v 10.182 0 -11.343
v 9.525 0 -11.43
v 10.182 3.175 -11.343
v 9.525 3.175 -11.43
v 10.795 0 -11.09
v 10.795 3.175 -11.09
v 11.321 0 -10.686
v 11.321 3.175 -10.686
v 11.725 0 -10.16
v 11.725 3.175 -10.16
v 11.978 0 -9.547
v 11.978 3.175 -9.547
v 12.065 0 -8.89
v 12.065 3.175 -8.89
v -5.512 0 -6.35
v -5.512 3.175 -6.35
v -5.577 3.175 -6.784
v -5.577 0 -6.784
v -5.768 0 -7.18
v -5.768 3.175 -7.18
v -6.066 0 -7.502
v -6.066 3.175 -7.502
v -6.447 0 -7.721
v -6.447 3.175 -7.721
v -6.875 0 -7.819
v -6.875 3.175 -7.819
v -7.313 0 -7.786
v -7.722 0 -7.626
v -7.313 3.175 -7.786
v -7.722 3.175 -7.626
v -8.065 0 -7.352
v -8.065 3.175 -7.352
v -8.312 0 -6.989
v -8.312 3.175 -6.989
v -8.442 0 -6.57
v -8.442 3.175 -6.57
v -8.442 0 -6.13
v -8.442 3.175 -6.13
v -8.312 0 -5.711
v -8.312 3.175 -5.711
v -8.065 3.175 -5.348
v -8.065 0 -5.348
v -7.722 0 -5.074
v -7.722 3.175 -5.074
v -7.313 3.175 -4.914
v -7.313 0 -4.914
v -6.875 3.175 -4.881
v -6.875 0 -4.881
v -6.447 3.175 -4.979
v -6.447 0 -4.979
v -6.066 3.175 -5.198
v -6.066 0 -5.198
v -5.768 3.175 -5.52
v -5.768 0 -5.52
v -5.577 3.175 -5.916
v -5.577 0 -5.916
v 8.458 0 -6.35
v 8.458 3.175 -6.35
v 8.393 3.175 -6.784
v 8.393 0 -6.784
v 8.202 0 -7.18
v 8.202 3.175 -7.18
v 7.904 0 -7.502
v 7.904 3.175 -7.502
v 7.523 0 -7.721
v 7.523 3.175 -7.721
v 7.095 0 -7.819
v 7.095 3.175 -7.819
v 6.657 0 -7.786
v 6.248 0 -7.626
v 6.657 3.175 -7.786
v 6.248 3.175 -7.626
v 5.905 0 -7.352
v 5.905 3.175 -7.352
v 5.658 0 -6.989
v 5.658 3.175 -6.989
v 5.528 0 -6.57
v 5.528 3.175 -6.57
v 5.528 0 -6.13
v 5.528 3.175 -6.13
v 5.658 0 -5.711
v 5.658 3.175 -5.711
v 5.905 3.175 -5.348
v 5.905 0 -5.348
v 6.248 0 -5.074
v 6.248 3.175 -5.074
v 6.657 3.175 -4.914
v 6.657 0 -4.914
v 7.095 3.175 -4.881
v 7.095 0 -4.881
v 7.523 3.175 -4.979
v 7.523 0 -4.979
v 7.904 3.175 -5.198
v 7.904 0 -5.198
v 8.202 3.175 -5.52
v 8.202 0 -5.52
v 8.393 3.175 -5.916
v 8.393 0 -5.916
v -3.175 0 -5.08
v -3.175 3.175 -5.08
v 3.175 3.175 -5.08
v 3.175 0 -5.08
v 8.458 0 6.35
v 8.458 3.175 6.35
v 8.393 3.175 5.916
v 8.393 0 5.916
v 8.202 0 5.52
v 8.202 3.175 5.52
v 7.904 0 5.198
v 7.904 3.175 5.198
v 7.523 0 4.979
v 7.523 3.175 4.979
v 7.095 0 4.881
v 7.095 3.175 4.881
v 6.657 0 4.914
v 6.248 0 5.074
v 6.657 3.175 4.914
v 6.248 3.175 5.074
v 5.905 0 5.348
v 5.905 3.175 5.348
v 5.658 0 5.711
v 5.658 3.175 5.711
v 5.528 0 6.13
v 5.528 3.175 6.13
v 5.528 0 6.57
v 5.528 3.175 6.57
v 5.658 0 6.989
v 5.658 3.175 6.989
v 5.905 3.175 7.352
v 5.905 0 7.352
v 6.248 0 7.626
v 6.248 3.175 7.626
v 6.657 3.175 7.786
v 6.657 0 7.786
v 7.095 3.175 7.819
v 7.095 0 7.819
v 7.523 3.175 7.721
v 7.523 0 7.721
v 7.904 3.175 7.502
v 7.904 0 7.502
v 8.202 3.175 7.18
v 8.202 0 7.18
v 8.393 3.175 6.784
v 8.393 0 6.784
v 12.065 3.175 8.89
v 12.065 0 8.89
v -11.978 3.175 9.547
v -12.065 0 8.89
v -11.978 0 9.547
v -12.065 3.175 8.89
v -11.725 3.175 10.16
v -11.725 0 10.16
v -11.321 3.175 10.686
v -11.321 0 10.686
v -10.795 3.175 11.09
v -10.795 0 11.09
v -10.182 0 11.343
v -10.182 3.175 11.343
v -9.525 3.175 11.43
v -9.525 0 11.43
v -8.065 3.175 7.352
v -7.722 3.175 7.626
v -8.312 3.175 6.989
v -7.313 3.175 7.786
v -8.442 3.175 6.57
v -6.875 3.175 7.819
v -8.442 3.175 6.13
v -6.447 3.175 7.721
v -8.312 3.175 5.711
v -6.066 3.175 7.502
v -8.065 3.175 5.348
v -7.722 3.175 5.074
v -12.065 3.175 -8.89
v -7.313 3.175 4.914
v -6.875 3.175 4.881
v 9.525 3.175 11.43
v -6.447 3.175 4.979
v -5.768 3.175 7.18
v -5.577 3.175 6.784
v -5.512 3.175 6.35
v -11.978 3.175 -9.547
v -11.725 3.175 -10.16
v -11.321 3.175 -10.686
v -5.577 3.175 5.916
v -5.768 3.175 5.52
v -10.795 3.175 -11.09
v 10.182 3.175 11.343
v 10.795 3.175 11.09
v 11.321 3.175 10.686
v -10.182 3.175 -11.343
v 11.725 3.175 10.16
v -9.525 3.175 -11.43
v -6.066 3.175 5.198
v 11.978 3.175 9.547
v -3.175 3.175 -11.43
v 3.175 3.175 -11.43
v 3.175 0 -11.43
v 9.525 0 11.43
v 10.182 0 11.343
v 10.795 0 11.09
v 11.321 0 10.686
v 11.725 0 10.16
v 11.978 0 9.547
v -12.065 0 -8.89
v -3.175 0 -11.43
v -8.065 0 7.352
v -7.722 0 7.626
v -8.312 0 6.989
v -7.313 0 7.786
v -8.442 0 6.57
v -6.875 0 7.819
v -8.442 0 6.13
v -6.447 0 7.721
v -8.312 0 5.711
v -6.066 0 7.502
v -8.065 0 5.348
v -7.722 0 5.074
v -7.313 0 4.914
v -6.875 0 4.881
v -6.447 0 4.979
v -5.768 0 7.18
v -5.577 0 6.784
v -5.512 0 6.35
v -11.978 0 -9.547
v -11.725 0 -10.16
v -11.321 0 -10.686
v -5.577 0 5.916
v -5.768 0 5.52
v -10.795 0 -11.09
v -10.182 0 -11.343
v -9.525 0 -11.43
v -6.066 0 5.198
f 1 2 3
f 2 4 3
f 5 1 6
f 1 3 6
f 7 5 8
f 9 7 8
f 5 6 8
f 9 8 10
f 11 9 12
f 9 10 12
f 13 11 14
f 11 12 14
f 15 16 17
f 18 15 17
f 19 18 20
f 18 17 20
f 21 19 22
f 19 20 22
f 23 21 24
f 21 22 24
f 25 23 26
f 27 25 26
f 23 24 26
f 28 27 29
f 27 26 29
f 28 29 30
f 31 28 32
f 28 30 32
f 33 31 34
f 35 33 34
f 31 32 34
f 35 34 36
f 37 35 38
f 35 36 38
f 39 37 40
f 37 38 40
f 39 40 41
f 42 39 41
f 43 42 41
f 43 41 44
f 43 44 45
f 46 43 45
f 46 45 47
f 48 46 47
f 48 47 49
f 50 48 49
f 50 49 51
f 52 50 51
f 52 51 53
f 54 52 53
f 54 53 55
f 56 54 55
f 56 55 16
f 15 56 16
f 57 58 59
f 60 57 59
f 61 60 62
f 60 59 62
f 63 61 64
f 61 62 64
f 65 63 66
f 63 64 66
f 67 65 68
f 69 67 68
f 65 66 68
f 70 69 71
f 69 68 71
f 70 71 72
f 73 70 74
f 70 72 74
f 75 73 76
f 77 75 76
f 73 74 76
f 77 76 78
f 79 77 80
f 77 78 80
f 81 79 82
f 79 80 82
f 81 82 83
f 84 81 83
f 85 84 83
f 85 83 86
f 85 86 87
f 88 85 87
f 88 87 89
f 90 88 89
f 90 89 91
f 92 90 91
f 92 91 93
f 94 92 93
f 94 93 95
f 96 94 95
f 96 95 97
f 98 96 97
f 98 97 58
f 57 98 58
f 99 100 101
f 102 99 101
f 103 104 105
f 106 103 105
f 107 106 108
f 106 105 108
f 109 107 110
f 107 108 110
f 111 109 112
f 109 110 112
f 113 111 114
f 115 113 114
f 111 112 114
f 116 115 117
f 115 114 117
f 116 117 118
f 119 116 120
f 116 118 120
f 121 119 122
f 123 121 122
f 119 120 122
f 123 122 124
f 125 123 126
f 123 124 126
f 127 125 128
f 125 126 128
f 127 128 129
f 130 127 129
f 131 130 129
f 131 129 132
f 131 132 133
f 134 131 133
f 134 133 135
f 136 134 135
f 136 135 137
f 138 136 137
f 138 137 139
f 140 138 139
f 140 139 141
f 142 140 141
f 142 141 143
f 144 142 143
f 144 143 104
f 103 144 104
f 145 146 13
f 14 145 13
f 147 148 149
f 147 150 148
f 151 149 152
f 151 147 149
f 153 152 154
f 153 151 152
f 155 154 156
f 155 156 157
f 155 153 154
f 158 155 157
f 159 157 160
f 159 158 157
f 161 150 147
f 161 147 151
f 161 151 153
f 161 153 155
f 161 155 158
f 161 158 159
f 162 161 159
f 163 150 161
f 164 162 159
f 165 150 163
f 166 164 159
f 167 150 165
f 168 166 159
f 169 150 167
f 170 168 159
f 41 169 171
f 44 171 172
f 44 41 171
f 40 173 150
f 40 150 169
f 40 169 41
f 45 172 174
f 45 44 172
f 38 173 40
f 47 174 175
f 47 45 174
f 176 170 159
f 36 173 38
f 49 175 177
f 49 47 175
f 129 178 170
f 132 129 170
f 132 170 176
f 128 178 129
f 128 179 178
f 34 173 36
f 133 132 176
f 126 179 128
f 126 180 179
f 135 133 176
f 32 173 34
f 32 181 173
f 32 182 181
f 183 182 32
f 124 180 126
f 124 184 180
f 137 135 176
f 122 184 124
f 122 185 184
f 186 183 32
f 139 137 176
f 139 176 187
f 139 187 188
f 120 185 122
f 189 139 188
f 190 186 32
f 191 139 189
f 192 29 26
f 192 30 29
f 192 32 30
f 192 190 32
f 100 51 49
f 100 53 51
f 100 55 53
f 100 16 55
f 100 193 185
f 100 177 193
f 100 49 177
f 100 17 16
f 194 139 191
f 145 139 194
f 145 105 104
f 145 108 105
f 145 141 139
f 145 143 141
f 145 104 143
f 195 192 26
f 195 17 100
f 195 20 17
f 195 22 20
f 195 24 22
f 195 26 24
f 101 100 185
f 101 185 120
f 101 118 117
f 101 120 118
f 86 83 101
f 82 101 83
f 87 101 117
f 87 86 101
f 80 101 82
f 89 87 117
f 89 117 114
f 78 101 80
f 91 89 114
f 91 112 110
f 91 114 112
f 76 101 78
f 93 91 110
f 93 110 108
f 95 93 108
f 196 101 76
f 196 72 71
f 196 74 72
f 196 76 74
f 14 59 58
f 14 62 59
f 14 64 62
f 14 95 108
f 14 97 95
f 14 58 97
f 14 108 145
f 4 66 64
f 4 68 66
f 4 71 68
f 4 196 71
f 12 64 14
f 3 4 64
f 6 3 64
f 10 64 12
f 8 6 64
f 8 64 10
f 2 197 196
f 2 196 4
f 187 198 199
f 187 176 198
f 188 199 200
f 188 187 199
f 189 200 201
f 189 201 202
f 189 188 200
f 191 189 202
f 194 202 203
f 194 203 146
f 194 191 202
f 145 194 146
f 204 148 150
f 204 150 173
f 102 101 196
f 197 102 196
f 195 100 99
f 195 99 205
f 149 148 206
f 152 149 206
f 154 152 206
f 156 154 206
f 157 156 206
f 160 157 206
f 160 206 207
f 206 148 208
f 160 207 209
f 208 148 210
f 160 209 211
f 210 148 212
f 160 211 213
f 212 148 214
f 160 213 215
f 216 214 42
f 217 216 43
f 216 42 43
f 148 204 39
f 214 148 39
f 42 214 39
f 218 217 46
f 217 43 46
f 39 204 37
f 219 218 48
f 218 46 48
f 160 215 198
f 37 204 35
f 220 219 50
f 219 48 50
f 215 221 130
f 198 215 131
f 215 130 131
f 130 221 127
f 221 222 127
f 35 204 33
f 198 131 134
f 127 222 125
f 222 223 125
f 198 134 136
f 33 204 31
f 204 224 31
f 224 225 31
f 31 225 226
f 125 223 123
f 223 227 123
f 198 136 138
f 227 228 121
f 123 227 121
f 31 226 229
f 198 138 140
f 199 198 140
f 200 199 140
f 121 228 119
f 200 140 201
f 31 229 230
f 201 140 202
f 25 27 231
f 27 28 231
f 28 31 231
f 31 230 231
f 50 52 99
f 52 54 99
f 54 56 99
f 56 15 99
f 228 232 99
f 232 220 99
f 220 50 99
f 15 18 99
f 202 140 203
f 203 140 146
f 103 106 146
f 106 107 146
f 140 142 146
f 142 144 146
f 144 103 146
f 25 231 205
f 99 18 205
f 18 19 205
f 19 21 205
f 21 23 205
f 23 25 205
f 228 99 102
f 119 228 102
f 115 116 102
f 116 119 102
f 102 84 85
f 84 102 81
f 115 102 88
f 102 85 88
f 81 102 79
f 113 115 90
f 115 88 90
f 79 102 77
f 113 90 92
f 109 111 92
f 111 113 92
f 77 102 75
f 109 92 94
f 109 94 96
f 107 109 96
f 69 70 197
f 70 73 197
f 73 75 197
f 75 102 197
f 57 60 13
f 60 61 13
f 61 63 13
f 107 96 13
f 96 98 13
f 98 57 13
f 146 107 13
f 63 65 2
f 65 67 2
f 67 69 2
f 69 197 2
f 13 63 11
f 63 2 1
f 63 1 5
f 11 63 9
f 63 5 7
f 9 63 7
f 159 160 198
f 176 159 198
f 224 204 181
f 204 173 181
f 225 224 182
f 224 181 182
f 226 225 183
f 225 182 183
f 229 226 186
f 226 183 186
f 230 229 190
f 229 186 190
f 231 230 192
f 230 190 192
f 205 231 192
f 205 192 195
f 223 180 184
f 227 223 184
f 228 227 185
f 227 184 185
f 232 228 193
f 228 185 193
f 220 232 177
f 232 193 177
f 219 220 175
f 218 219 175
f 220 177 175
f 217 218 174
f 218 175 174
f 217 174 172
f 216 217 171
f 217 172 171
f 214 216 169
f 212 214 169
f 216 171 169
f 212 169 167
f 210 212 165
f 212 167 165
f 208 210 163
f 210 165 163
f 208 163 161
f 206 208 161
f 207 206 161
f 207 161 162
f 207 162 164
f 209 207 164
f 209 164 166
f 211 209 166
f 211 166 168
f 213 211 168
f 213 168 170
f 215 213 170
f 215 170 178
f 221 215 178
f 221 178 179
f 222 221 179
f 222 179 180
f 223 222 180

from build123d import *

# Parameters (mm, degrees)
SKETCH1_W           = 24.13
SKETCH1_H           = 22.86
BOSS_EXTRUDE1_DEPTH = 3.175
SKETCH2_R           = 1.4732
CUT_EXTRUDE1_DEPTH  = 4.175
FILLET1_R           = 2.54
SKETCH3_W           = 6.35
SKETCH3_H           = 6.35
CUT_EXTRUDE2_DEPTH  = 4.175


with BuildPart() as part:
    # Sketch1 → Boss-Extrude1 (new body)
    with BuildSketch(Plane(origin=(0, 0, 0), x_dir=(1, 0, 0), z_dir=(0, 1, 0))):
        Rectangle(SKETCH1_W, SKETCH1_H)
    extrude(amount=BOSS_EXTRUDE1_DEPTH)

    # Sketch2 → Cut-Extrude1 (cut, through all)
    with BuildSketch(Plane(origin=(0, 3.175, 0), x_dir=(1, 0, 0), z_dir=(0, 1, 0))):
        with Locations((-6.985, 6.35)):
            Circle(SKETCH2_R)
        with Locations((-6.985, -6.35)):
            Circle(SKETCH2_R)
        with Locations((6.985, -6.35)):
            Circle(SKETCH2_R)
        with Locations((6.985, 6.35)):
            Circle(SKETCH2_R)
    extrude(amount=-CUT_EXTRUDE1_DEPTH, mode=Mode.SUBTRACT)

    # Fillet1
    fillet1_edges = [part.edges().sort_by_distance(p)[0] for p in [
        (12.065, 1.5875, 11.43),
        (-12.065, 1.5875, 11.43),
        (-12.065, 1.5875, -11.43),
        (12.065, 1.5875, -11.43),
    ]]
    fillet(fillet1_edges, radius=FILLET1_R)

    # Sketch3 → Cut-Extrude2 (cut, through all)
    with BuildSketch(Plane(origin=(0, 3.175, 0), x_dir=(1, 0, 0), z_dir=(0, 1, 0))):
        with Locations((0, 8.255)):
            Rectangle(SKETCH3_W, SKETCH3_H)
    extrude(amount=-CUT_EXTRUDE2_DEPTH, mode=Mode.SUBTRACT)


solid = part.part
